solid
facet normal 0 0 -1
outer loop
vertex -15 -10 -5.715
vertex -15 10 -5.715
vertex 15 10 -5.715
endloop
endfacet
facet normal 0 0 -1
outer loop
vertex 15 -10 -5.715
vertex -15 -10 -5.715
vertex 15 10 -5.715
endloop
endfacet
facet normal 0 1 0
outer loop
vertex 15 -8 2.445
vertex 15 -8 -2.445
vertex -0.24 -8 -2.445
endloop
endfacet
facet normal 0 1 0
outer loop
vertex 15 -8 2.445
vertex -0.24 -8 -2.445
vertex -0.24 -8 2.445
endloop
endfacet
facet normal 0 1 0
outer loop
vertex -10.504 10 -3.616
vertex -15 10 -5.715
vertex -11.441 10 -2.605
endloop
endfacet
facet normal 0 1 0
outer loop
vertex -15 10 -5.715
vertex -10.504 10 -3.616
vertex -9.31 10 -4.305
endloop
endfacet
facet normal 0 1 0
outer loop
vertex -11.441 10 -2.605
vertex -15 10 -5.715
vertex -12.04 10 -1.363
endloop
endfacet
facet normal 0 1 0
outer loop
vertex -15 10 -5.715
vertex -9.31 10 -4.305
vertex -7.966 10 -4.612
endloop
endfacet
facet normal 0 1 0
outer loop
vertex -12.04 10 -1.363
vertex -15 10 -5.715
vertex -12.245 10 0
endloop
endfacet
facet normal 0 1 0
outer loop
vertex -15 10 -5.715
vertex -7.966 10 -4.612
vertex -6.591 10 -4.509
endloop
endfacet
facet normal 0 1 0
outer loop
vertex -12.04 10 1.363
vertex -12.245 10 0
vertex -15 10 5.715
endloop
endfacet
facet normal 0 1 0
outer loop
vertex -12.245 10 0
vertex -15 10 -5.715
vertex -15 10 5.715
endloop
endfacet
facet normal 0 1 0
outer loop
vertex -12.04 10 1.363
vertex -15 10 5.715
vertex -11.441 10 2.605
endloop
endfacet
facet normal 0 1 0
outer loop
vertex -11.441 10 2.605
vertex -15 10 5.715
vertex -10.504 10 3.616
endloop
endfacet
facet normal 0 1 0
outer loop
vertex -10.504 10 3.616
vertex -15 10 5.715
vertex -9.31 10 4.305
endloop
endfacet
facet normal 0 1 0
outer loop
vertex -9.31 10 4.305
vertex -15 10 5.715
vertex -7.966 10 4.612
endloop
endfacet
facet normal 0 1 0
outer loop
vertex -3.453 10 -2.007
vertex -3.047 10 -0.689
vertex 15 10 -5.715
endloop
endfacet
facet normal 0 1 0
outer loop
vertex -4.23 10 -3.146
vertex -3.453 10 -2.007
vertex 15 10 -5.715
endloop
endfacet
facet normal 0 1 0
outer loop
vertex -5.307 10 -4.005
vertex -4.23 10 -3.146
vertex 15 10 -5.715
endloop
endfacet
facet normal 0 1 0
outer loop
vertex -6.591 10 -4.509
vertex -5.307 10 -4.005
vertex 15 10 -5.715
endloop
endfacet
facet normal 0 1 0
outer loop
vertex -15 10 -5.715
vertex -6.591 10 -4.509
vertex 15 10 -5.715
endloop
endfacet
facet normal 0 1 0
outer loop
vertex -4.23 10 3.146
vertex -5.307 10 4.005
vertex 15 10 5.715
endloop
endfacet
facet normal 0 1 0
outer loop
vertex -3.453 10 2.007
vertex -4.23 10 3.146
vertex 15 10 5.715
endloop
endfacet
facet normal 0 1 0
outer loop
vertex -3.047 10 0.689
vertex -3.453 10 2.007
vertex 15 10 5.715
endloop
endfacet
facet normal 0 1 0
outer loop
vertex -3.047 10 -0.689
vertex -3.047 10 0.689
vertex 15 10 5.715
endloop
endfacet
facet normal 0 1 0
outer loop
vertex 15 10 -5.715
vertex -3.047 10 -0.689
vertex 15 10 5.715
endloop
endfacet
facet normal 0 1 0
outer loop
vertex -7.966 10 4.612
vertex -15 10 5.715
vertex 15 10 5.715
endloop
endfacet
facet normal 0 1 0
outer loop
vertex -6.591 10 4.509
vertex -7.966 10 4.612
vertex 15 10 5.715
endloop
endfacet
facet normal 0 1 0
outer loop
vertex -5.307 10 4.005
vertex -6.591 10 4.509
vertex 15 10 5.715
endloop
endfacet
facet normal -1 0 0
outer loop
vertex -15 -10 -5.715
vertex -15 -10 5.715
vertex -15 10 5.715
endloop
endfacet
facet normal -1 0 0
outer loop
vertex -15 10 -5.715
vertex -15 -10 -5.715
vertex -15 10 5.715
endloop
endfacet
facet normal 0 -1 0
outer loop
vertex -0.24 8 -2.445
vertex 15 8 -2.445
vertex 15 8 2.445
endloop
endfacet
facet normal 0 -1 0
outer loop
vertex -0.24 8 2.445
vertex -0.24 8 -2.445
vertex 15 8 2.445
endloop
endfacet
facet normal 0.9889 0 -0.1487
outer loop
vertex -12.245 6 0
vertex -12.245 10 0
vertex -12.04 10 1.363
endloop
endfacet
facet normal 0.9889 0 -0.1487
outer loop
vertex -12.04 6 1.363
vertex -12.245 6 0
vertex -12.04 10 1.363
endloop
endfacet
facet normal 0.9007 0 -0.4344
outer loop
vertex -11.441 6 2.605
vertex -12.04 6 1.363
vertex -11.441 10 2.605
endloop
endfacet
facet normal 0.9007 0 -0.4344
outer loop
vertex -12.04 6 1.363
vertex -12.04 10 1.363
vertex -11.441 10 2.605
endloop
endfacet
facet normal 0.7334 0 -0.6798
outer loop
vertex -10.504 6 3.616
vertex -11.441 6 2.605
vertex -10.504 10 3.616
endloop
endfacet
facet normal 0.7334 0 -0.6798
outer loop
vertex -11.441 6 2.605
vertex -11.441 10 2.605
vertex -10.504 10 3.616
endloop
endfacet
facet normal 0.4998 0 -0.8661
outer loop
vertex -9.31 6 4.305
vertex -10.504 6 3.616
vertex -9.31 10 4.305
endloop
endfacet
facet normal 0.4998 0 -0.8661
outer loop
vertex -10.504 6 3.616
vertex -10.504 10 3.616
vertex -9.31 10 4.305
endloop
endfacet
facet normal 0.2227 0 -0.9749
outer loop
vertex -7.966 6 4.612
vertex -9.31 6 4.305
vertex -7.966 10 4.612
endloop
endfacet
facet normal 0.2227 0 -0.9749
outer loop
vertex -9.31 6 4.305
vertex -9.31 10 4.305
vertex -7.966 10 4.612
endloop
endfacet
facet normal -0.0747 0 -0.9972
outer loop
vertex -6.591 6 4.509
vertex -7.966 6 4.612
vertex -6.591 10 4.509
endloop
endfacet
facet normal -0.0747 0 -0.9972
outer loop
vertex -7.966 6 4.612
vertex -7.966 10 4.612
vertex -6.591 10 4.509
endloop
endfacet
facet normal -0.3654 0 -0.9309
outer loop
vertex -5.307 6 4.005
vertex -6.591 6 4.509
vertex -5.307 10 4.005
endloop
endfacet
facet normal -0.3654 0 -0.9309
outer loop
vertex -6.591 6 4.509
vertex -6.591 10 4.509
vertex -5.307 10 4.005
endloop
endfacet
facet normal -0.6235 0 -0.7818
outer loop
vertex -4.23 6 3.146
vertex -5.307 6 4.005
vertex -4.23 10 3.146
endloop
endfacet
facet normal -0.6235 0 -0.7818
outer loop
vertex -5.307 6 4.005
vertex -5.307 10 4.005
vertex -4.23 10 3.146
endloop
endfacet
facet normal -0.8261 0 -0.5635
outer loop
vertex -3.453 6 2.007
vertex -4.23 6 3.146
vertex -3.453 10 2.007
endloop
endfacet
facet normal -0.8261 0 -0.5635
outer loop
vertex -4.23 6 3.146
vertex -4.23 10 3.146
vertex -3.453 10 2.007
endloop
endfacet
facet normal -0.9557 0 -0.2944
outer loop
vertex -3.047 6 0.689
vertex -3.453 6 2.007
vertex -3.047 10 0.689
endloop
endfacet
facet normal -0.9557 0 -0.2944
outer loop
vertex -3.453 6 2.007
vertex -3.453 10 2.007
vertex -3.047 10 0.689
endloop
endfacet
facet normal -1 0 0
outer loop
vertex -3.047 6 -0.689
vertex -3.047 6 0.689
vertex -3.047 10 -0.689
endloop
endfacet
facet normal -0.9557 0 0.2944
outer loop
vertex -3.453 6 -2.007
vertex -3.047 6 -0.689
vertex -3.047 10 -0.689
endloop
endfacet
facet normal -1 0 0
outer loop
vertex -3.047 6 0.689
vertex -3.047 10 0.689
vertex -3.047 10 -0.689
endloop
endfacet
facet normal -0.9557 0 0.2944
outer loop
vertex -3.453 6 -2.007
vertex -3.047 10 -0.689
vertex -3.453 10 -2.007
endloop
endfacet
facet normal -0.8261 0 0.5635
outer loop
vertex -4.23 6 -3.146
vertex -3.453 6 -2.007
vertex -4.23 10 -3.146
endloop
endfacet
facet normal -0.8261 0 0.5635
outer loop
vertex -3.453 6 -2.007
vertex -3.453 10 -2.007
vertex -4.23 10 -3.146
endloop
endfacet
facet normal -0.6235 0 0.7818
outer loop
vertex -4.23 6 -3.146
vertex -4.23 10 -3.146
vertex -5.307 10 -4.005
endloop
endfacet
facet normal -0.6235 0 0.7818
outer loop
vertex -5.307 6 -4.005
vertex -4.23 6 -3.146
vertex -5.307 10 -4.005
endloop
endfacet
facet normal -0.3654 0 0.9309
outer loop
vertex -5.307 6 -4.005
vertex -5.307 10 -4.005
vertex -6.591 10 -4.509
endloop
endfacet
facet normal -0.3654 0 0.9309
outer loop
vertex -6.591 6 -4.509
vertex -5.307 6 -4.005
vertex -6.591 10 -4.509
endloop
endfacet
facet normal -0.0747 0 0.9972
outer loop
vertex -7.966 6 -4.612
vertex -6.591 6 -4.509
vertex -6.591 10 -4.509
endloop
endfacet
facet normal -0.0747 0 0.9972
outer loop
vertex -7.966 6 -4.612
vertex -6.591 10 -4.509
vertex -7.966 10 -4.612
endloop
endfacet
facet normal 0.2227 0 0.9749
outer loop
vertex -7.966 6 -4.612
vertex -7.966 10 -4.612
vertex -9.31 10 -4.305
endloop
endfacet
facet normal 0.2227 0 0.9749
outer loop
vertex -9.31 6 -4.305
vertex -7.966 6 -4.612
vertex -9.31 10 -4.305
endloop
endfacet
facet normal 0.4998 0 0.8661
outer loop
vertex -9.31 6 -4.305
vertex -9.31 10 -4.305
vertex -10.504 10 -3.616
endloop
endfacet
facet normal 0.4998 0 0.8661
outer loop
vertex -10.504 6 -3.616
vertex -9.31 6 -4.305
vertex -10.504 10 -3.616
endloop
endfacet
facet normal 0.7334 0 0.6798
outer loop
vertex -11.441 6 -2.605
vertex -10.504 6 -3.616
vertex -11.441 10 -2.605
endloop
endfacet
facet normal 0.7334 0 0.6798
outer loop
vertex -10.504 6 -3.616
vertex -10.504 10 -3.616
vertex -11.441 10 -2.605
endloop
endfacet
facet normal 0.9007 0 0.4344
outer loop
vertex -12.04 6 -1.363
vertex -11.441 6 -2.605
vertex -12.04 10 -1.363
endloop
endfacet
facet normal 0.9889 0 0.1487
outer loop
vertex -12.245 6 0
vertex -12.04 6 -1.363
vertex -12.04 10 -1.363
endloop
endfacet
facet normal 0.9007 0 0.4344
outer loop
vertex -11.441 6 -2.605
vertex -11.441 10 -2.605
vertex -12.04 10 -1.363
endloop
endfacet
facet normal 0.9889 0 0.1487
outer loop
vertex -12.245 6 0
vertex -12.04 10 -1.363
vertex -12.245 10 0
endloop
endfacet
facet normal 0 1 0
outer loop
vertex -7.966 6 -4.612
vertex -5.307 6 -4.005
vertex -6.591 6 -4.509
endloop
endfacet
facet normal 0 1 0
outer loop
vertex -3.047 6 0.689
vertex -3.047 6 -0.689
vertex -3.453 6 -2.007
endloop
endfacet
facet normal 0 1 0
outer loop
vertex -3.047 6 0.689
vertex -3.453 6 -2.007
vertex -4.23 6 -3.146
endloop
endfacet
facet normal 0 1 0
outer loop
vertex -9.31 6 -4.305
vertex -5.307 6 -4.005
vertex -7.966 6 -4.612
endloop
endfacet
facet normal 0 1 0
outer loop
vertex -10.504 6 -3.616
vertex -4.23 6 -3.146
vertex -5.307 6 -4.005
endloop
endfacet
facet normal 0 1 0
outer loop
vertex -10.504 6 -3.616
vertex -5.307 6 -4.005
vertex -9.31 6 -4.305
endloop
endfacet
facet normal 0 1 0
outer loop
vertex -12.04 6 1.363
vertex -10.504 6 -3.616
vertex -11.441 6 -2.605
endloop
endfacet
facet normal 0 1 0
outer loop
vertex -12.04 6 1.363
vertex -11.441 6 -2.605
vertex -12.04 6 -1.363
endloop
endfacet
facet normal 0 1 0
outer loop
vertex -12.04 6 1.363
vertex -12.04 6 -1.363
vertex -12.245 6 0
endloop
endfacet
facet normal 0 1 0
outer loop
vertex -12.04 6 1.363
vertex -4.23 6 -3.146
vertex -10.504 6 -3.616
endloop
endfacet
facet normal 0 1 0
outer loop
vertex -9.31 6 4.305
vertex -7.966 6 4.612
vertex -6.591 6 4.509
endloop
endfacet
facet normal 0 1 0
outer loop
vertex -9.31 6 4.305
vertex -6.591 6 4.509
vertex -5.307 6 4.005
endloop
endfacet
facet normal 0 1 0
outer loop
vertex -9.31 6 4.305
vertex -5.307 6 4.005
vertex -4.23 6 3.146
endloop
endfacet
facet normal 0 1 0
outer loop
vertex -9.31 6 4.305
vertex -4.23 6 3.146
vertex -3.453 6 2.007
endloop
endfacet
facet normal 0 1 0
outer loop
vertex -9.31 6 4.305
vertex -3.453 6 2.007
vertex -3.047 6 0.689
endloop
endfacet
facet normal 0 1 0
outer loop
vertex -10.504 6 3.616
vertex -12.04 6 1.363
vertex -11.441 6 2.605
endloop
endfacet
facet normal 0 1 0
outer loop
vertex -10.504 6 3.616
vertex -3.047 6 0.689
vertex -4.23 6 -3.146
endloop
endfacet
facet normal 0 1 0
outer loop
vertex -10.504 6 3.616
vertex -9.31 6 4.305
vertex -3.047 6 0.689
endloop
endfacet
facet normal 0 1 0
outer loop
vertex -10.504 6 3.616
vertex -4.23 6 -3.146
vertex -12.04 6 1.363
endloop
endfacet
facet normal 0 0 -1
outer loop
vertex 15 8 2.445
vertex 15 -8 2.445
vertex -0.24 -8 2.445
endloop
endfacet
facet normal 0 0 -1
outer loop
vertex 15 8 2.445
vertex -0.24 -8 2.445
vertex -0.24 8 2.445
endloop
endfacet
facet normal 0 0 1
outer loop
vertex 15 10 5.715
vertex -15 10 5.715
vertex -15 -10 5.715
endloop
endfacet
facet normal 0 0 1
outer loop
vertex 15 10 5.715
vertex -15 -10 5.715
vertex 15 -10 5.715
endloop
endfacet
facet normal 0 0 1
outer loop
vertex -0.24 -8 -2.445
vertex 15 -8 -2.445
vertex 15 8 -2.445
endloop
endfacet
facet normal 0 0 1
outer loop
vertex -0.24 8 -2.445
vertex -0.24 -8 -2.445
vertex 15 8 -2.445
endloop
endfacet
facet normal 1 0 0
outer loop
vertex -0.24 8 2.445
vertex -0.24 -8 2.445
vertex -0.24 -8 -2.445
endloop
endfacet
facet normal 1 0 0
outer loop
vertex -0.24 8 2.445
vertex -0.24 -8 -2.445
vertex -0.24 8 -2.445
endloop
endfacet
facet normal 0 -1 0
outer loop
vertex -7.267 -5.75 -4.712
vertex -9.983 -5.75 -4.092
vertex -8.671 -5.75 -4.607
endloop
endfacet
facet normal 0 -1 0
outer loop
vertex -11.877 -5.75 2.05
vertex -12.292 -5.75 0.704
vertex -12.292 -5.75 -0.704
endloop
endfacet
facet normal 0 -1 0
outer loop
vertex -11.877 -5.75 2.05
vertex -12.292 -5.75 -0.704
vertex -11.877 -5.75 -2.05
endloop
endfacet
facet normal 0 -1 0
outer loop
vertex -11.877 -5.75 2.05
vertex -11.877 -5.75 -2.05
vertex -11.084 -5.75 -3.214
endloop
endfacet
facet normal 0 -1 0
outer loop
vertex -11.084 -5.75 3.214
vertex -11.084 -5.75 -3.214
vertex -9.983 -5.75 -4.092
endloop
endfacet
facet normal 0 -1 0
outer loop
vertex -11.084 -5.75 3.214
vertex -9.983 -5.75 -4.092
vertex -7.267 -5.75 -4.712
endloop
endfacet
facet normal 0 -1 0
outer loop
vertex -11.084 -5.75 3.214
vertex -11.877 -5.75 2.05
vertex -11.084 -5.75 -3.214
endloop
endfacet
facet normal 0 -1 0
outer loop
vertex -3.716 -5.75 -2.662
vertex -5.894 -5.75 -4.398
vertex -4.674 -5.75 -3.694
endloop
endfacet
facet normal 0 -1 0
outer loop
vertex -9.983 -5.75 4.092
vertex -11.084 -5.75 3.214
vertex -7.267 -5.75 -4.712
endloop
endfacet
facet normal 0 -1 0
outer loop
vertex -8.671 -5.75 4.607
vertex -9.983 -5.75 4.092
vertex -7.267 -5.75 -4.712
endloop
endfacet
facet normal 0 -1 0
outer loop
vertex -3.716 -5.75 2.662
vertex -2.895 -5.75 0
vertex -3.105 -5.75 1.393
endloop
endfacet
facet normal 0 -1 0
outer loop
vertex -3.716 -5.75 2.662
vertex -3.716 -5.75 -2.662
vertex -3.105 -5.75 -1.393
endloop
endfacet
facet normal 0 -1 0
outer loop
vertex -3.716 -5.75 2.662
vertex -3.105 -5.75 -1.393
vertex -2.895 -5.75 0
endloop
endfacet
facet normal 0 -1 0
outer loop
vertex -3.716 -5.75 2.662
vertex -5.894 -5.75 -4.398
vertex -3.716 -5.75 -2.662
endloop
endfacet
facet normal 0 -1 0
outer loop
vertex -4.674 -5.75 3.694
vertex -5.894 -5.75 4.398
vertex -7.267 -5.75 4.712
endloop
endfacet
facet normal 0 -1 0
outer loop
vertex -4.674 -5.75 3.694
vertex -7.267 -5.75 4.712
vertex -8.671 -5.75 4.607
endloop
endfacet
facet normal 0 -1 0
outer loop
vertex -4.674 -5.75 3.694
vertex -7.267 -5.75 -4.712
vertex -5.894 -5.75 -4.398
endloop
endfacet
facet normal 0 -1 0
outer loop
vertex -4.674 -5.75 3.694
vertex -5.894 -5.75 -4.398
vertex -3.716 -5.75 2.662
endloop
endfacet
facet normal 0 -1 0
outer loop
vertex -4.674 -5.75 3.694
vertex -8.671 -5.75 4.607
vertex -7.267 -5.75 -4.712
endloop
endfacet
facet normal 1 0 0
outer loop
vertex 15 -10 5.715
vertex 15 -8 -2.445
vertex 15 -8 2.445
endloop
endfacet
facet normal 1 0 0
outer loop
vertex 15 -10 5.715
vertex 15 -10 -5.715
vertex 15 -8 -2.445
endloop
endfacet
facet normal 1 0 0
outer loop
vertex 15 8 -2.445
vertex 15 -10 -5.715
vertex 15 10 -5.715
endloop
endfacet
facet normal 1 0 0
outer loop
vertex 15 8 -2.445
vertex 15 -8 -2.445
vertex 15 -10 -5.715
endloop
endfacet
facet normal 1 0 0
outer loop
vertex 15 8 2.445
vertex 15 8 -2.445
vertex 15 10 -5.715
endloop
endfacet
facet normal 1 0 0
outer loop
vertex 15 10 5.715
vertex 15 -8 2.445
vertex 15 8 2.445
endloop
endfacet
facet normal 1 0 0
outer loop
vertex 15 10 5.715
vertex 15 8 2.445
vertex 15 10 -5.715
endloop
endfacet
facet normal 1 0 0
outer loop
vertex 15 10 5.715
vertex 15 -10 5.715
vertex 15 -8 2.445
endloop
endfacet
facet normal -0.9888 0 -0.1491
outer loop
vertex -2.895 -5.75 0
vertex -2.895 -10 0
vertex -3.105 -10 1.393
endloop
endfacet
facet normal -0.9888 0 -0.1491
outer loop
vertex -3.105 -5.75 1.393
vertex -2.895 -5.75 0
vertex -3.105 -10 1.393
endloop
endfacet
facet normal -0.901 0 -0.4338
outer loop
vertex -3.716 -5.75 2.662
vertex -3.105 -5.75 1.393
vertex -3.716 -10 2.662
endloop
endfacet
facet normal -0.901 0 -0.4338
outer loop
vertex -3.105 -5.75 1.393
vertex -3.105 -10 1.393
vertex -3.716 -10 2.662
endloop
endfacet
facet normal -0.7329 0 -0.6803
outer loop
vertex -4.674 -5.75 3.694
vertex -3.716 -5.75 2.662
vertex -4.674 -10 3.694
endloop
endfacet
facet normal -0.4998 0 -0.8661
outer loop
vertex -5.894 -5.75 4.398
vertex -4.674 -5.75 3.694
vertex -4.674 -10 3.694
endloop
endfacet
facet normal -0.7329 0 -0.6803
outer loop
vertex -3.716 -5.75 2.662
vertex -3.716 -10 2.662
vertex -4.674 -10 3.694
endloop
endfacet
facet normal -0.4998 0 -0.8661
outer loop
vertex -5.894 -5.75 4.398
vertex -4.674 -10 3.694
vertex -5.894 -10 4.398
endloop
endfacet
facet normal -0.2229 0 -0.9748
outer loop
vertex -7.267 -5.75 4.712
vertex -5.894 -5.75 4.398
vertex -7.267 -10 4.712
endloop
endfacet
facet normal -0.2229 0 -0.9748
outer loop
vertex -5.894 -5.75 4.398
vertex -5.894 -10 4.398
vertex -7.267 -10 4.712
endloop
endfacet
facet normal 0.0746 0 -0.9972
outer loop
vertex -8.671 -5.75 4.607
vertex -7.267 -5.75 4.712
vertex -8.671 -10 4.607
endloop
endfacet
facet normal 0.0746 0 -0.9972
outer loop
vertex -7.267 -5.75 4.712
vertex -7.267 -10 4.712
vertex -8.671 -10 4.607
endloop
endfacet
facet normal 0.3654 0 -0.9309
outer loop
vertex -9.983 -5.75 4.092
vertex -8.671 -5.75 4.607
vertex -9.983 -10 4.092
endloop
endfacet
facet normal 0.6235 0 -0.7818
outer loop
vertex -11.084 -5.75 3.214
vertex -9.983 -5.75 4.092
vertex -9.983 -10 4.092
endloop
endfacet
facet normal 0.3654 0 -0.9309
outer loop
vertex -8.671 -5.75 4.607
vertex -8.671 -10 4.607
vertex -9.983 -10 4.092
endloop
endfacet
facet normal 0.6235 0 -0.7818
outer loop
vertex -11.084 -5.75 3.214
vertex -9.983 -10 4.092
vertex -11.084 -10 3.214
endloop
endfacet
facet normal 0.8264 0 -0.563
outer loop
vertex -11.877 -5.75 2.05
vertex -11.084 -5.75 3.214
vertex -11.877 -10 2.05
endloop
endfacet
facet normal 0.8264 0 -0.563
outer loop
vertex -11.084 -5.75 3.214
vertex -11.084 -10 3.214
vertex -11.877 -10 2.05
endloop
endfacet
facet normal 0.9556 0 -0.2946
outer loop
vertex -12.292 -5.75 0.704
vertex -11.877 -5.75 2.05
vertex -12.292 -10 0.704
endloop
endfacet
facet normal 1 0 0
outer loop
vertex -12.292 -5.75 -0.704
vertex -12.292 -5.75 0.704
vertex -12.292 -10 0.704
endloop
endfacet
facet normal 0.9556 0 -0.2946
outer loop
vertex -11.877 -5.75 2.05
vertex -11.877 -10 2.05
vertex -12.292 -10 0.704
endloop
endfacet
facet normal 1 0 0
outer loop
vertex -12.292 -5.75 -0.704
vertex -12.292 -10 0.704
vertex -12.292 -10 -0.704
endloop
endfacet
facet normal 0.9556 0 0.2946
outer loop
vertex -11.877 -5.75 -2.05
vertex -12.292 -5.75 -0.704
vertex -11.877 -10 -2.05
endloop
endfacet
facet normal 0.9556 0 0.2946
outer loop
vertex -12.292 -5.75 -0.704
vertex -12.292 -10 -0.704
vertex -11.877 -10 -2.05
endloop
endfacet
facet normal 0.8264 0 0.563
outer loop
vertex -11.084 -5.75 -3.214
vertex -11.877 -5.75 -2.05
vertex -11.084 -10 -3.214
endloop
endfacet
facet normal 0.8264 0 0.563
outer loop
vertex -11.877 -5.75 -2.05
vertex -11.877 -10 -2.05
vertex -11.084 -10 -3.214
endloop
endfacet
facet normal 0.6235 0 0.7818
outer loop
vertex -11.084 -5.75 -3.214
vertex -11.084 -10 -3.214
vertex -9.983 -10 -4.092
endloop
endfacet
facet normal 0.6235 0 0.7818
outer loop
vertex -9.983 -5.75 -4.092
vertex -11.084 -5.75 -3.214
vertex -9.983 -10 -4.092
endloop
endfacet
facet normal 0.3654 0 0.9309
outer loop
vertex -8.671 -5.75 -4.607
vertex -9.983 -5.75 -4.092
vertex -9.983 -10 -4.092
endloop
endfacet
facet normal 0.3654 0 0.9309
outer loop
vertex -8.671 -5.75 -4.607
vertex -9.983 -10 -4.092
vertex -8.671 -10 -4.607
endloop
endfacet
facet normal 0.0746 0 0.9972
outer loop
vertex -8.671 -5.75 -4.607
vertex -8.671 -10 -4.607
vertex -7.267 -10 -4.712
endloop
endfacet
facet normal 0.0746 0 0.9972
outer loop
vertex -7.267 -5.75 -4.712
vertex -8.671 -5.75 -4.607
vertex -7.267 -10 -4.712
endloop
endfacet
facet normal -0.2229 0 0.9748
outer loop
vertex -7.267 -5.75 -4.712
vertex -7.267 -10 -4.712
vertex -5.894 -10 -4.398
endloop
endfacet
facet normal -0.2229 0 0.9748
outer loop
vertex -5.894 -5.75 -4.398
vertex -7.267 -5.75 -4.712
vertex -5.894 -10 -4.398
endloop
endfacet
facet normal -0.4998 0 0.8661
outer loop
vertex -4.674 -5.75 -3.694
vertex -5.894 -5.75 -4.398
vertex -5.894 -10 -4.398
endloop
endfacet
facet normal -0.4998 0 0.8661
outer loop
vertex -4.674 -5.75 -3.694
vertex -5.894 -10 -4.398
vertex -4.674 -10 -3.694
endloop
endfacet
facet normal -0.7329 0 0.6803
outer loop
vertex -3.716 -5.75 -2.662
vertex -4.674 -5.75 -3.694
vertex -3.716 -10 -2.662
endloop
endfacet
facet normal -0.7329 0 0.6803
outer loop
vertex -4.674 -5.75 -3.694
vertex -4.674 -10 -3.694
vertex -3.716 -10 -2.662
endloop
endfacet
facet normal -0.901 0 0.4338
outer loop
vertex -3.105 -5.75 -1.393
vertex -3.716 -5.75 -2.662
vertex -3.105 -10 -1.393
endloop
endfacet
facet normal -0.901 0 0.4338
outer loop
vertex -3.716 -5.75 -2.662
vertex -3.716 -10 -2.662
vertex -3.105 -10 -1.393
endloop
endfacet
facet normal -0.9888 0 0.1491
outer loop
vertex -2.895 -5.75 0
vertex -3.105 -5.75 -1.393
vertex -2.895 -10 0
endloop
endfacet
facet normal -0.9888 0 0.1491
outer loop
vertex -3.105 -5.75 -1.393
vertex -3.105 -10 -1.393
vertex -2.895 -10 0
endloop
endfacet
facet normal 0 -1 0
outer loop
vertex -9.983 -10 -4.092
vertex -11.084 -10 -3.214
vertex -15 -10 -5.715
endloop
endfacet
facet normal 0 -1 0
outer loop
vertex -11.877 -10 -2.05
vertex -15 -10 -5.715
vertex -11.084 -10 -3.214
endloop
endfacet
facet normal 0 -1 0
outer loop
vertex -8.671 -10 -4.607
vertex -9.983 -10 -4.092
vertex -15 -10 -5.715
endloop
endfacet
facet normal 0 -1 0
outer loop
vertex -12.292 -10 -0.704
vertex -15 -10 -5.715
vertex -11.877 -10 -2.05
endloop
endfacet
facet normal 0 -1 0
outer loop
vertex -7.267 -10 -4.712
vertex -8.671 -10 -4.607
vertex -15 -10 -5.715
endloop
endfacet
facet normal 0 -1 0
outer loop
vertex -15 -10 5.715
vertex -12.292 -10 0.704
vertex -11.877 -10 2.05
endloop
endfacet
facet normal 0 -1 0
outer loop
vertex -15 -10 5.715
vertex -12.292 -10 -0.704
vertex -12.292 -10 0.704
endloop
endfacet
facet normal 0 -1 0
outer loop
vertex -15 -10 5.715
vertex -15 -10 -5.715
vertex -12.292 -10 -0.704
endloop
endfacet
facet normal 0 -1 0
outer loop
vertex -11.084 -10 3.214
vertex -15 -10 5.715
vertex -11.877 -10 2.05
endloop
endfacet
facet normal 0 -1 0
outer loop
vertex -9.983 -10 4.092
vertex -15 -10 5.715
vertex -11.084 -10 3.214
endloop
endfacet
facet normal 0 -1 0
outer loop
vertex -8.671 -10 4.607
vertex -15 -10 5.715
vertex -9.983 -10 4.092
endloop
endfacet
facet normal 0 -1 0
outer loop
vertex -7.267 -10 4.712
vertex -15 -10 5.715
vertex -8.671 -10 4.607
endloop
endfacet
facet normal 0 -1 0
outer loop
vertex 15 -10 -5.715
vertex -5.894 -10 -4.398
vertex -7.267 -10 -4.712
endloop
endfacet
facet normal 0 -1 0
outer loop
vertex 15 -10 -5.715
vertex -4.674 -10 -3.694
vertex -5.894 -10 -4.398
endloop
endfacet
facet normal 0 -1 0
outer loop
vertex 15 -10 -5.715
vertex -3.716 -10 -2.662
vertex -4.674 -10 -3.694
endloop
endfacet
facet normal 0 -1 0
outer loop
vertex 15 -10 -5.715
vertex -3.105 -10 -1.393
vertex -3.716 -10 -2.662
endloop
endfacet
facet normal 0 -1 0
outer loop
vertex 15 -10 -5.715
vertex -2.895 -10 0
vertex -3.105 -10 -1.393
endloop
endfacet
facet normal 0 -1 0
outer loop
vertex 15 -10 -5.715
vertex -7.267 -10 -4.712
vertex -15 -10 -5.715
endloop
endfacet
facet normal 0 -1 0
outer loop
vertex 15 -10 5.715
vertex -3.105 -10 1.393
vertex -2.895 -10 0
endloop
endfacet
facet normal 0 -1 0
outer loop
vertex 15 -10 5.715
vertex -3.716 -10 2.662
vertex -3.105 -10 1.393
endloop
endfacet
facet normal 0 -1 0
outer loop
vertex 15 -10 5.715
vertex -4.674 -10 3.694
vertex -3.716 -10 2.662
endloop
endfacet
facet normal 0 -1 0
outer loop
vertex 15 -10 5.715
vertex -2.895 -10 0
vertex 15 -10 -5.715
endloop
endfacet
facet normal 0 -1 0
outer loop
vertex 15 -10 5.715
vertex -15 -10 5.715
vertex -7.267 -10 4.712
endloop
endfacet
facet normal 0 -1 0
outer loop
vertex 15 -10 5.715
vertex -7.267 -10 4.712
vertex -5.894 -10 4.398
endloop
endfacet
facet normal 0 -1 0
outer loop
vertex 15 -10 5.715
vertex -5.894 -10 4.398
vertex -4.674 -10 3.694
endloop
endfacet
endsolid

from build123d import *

# Parameters (mm, degrees)
F0_W     = 30
F0_H     = 20
F1_DEPTH = 5.715
F2_W     = 16
F2_H     = 4.89
F3_DEPTH = 15.24
F4_R     = 4.625
F5_DEPTH = 4
F6_R     = 4.725
F6_R_2   = 4.625
F7_DEPTH = 4.25


with BuildPart() as f1:
    # F0 (on Top) → F1 (new body, symmetric)
    with BuildSketch(Plane.XY):
        Rectangle(F0_W, F0_H)
    extrude(amount=F1_DEPTH, both=True)

    # F2 (on face) → F3 (cut)
    with BuildSketch(Plane.YZ.offset(15)):
        Rectangle(F2_W, F2_H)
    extrude(amount=-F3_DEPTH, mode=Mode.SUBTRACT)

    # F4 (on face) → F5 (cut)
    with BuildSketch(Plane(origin=(0, 10, 0), x_dir=(-1, 0, 0), z_dir=(0, 1, 0))):
        with Locations((7.62, 0)):
            Circle(F4_R)
    extrude(amount=-F5_DEPTH, mode=Mode.SUBTRACT)

    # F6 (on face) → F7 (cut)
    with BuildSketch(Plane.XZ.offset(10)):
        with Locations((-7.62, 0)):
            Circle(F6_R)
        with Locations((-7.62, 0)):
            Circle(F6_R_2, mode=Mode.SUBTRACT)
        with Locations((-7.62, 0)):
            Circle(F6_R_2)
    extrude(amount=-F7_DEPTH, mode=Mode.SUBTRACT)


solid = f1.part
